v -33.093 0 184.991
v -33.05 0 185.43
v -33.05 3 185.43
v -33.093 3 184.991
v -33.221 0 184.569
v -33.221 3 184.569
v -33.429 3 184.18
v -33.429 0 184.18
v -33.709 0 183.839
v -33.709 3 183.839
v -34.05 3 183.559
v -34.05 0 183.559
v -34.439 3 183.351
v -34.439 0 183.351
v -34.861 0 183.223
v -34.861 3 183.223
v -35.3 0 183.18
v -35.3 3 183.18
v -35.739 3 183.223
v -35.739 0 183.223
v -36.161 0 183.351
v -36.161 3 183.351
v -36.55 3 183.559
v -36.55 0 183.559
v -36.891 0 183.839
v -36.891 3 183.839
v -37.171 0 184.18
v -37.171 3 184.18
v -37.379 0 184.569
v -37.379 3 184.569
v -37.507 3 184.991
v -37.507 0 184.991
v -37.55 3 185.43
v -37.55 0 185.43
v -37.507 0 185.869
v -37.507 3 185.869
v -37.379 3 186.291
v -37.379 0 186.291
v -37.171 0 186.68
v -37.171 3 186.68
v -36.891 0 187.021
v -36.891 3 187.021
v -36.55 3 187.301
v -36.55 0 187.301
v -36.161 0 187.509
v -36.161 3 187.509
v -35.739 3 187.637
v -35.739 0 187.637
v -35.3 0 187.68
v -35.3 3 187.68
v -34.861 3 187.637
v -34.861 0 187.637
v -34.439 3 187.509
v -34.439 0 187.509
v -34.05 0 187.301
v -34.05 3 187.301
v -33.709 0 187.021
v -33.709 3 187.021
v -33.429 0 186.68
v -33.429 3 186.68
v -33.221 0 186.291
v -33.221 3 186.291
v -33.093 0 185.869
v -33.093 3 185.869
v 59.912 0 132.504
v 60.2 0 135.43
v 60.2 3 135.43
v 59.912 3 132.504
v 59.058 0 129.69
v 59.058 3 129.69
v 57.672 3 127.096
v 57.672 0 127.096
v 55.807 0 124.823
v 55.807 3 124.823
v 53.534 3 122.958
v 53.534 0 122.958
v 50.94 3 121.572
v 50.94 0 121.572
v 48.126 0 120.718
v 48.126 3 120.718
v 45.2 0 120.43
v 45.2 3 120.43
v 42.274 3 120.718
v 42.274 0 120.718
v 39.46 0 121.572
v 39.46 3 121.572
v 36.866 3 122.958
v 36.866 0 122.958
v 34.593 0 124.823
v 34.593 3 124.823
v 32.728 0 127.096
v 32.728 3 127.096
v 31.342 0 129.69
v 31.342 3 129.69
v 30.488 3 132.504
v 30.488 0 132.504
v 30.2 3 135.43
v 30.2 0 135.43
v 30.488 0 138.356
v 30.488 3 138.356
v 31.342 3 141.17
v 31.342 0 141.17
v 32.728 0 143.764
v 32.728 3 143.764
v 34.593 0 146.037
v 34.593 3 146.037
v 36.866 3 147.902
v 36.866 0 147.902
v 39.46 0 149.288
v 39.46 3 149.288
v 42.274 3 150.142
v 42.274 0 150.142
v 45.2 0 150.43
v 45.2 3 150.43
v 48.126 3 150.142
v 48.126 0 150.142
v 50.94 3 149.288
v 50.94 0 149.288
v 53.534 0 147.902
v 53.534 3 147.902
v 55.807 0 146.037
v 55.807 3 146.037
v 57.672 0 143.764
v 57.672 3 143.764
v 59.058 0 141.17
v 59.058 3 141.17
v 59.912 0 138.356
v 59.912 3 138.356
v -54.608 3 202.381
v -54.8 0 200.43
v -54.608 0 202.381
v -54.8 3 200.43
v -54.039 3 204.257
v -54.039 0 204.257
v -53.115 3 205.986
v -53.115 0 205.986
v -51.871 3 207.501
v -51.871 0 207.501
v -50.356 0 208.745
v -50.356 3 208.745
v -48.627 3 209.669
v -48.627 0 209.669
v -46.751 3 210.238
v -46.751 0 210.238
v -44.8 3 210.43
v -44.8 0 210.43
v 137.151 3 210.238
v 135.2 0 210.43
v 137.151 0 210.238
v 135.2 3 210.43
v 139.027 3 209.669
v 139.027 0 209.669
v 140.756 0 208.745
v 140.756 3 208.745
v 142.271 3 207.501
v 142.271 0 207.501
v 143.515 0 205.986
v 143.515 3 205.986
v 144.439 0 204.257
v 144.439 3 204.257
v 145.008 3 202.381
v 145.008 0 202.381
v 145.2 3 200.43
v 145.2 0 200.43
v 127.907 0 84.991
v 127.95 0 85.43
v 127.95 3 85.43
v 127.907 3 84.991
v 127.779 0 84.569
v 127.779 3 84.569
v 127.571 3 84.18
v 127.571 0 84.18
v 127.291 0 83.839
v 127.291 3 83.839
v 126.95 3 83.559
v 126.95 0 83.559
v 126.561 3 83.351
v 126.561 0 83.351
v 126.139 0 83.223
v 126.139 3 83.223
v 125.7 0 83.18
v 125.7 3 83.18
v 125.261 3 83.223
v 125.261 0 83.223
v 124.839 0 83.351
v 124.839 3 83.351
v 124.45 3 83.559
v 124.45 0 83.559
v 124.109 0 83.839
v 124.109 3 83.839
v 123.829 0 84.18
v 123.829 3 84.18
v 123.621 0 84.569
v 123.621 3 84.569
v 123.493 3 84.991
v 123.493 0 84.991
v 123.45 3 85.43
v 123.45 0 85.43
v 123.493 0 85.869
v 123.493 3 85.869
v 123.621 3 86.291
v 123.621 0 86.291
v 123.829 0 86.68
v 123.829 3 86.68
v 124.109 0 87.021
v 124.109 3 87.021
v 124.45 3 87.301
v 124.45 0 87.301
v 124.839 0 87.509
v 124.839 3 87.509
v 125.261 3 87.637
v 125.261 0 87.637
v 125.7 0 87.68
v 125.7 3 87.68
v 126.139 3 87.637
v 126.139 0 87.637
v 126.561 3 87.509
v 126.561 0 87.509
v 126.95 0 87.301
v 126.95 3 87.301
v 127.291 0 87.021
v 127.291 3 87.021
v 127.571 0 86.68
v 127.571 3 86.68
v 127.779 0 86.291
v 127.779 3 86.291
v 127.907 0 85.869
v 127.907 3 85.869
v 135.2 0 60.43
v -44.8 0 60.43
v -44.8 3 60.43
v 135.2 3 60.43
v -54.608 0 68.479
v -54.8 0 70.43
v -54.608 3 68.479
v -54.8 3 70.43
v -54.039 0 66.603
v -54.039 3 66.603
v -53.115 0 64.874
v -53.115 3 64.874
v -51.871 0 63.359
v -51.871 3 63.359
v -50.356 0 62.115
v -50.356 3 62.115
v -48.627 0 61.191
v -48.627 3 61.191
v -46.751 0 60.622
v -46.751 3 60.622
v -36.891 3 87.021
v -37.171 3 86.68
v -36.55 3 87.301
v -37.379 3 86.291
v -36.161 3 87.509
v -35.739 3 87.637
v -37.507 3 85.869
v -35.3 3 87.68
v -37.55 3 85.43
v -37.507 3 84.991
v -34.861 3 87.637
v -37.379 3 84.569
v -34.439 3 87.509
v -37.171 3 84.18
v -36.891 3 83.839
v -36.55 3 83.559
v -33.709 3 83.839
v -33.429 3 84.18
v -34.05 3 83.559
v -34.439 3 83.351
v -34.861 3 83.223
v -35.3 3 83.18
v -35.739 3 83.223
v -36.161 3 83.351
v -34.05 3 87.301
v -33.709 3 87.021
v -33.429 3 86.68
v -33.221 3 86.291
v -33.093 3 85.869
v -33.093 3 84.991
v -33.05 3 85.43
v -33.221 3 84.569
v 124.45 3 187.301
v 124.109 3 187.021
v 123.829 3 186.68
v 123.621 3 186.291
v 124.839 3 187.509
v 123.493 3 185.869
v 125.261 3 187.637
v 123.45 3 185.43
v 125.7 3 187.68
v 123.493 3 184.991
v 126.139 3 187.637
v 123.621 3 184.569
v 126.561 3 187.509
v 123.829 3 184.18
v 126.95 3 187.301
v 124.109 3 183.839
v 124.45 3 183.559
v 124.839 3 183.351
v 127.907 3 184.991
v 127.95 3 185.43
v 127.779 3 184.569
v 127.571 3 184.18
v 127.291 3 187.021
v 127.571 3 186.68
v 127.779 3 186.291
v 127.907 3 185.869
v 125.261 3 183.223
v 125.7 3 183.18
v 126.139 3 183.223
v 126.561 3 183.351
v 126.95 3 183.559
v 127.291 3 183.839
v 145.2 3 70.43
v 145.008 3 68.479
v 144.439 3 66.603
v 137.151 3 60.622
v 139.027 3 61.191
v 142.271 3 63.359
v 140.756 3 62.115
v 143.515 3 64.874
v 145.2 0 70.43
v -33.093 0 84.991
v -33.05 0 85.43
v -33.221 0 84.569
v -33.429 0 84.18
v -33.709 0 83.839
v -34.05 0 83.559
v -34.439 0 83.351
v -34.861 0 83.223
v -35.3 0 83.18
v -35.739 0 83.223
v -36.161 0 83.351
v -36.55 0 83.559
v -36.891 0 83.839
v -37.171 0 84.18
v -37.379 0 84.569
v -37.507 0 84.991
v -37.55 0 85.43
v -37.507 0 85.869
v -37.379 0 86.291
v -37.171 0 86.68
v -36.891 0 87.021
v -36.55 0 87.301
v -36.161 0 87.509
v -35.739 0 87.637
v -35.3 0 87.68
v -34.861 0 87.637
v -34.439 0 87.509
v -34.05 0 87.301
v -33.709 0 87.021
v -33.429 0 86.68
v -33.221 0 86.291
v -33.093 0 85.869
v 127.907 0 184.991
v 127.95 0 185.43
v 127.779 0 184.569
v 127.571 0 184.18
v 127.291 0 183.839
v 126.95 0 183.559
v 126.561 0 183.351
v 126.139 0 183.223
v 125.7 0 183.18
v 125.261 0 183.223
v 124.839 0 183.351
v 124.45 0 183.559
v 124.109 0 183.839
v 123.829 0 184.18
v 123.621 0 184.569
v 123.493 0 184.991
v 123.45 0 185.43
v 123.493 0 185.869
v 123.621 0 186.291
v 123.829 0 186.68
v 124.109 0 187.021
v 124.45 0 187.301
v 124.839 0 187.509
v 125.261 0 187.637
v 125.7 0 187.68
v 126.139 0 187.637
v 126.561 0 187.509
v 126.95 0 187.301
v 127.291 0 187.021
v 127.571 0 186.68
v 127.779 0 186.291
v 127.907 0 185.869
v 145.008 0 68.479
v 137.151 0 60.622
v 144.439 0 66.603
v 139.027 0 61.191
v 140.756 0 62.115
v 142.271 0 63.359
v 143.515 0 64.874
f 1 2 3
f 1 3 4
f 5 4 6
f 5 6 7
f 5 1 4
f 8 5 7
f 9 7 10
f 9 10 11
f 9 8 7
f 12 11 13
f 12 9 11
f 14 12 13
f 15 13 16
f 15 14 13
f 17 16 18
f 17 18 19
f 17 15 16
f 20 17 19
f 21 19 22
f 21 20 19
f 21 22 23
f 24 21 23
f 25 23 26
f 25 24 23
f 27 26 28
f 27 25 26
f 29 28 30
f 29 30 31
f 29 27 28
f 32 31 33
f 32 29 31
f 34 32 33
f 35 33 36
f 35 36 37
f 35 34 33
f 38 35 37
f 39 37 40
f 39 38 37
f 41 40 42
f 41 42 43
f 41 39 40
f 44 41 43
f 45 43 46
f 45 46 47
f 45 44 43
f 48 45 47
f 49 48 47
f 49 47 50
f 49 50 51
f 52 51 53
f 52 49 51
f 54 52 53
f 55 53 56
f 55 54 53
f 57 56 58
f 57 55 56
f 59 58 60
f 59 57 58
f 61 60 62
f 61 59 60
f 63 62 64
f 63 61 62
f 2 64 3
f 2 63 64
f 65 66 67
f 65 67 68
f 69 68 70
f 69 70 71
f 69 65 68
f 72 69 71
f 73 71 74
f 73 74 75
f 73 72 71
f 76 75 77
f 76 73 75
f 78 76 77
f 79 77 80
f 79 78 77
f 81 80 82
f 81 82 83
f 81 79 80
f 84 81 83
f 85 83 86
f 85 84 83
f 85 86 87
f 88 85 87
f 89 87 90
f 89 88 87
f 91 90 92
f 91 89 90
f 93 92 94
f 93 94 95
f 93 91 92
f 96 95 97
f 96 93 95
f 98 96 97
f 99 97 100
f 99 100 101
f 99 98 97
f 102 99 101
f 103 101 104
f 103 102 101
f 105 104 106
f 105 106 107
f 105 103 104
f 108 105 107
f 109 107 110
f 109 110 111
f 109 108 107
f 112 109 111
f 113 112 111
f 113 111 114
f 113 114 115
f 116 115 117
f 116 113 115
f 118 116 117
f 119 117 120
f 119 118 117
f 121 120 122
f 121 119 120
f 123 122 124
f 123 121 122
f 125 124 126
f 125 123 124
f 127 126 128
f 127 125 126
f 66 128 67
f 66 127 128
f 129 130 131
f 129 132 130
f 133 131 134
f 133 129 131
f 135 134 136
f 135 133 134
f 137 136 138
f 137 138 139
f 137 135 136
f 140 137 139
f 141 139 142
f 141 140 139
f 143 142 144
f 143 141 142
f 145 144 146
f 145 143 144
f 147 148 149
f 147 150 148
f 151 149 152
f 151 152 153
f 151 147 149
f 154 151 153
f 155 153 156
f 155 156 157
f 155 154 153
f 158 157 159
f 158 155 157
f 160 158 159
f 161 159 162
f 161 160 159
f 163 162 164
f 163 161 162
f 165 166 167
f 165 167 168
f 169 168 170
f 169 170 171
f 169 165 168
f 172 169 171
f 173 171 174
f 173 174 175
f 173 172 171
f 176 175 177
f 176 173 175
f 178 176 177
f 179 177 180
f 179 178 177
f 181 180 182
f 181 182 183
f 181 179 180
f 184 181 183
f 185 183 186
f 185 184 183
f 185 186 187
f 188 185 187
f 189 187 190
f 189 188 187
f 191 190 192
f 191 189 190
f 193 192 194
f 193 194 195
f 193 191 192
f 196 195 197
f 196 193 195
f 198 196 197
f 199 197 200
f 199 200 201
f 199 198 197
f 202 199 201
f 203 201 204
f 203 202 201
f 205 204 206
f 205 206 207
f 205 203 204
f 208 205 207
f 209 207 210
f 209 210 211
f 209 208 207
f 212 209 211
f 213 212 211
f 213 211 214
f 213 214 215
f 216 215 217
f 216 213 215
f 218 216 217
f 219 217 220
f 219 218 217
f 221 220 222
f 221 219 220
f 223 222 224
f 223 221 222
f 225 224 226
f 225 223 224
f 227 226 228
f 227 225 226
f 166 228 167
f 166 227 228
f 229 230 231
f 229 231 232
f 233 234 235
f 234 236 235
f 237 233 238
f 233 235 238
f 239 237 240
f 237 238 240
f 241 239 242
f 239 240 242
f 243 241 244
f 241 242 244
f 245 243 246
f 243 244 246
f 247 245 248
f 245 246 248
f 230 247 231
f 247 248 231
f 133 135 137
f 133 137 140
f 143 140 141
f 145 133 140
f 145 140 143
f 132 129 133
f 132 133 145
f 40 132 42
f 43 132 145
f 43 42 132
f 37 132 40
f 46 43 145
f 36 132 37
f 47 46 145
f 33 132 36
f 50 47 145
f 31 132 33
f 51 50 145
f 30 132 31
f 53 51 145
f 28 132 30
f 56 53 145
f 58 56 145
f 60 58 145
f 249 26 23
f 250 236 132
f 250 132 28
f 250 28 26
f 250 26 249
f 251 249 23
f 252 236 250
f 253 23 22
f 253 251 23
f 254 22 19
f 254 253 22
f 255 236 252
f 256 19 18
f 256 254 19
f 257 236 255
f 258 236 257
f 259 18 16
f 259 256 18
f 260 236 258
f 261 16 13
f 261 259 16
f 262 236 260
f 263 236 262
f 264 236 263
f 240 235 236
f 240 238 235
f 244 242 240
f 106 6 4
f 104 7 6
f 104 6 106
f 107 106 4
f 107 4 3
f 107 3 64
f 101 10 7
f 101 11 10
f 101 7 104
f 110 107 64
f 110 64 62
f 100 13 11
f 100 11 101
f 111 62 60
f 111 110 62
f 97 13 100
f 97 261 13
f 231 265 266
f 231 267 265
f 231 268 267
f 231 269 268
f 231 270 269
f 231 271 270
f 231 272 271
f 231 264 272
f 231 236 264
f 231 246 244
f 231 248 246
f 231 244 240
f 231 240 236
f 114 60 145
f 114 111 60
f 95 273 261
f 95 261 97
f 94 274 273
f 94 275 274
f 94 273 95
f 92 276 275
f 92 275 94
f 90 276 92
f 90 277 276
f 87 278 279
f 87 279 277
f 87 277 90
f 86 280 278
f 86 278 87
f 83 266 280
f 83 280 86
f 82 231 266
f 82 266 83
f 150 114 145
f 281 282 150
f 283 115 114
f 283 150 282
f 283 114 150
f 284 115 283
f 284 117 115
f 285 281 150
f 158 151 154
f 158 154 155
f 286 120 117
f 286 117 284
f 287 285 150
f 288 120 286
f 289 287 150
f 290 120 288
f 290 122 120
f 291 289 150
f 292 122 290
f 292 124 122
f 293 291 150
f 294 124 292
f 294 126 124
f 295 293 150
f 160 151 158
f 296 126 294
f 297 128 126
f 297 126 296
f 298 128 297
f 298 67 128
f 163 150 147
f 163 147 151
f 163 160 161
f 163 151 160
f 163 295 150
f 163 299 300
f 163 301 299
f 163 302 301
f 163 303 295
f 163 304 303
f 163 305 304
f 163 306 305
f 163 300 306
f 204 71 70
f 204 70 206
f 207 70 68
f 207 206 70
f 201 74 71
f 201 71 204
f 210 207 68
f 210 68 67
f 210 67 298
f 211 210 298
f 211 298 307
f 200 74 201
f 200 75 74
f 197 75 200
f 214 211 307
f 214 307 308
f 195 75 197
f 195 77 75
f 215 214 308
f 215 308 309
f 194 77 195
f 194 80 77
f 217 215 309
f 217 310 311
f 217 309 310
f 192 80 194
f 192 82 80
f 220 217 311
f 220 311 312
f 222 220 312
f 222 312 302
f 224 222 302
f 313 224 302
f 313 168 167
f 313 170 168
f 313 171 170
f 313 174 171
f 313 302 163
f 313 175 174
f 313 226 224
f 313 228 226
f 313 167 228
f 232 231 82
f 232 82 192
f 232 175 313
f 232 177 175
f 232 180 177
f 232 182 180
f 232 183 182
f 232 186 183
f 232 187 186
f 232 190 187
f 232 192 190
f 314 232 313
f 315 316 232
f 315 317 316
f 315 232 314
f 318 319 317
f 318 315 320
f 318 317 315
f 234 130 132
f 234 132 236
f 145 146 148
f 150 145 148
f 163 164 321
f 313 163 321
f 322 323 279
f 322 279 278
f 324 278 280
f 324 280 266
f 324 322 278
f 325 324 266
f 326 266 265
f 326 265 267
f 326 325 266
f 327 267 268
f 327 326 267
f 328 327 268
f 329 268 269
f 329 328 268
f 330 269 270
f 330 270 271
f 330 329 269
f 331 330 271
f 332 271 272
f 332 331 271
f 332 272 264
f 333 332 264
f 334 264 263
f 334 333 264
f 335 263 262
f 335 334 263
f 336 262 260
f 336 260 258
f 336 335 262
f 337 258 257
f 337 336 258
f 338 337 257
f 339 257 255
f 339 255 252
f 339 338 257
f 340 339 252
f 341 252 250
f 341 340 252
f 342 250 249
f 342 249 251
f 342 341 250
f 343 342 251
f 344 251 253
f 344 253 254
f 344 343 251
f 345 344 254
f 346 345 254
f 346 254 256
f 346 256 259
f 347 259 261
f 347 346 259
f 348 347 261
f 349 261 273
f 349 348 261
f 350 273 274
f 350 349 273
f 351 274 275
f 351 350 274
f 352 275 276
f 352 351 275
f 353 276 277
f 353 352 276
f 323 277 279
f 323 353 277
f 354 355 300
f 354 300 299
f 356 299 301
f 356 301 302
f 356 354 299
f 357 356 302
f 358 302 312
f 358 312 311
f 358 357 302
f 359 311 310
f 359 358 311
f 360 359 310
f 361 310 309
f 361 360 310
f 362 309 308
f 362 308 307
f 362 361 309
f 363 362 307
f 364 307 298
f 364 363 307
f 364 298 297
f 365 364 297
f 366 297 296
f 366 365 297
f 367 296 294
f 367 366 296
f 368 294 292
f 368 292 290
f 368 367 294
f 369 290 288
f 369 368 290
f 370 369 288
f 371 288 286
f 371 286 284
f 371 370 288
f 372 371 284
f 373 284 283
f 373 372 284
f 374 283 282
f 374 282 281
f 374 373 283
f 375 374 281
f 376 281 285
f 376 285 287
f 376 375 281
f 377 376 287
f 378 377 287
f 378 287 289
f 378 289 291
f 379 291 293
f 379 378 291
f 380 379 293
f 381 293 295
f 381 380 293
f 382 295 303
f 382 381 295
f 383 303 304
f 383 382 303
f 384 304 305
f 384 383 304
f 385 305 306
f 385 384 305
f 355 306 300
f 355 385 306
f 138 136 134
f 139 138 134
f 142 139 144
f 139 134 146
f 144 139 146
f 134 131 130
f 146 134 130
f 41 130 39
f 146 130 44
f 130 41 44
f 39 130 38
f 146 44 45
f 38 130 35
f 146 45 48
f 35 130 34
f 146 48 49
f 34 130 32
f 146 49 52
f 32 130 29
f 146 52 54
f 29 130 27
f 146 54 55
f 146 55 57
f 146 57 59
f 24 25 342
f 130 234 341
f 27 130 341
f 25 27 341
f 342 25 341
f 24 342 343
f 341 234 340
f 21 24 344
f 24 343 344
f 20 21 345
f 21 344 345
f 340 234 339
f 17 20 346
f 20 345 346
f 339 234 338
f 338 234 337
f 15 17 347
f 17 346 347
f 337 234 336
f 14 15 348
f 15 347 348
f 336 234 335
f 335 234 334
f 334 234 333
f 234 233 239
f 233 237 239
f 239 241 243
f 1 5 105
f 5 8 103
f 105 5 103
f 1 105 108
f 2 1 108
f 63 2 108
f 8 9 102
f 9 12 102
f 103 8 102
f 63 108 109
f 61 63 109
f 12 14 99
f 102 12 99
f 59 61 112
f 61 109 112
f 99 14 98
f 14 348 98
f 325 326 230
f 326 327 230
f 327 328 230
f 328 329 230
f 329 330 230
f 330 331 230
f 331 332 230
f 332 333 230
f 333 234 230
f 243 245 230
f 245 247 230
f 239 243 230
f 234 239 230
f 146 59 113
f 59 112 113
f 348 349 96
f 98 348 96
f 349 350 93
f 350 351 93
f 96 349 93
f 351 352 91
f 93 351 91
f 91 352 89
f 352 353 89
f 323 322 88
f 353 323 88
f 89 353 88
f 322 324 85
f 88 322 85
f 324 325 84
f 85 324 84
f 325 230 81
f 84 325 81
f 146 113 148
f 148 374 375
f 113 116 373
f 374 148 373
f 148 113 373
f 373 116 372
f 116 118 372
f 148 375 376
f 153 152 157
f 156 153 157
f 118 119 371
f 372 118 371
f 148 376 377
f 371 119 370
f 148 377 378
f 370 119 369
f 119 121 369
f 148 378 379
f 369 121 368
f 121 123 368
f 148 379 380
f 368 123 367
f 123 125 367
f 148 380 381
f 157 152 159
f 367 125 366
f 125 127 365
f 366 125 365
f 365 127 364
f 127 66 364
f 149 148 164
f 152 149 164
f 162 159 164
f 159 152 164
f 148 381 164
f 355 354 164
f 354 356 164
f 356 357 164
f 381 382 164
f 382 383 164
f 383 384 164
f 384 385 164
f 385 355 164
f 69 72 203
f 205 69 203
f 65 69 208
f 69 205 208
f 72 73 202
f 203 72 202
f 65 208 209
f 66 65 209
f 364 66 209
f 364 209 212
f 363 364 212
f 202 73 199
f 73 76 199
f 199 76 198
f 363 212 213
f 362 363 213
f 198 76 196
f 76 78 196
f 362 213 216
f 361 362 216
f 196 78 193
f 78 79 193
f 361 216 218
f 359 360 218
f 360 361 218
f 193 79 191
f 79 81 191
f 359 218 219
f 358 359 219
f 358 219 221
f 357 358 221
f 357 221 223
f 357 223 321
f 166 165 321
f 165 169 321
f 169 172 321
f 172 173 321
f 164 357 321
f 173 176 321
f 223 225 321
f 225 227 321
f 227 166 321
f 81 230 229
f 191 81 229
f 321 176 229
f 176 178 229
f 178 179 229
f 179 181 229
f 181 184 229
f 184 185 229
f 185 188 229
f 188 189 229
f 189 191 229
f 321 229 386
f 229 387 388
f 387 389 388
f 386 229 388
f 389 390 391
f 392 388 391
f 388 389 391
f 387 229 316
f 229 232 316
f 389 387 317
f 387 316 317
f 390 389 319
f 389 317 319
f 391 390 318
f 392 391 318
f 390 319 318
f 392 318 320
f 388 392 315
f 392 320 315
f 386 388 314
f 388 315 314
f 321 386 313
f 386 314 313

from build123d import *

# Parameters (mm, degrees)
SKETCH1_W           = 200
SKETCH1_H           = 150
SKETCH1_R           = 2.25
SKETCH1_R_2         = 15
BOSS_EXTRUDE1_DEPTH = 3
FILLET1_R           = 10


with BuildPart() as part:
    # Sketch1 → Boss-Extrude1 (new body)
    with BuildSketch(Plane(origin=(0, 0, 0), x_dir=(1, 0, 0), z_dir=(0, 1, 0))):
        with Locations((45.2, -135.43)):
            Rectangle(SKETCH1_W, SKETCH1_H)
        with Locations((-35.3, -85.43)):
            Circle(SKETCH1_R, mode=Mode.SUBTRACT)
        with Locations((125.7, -85.43)):
            Circle(SKETCH1_R, mode=Mode.SUBTRACT)
        with Locations((125.7, -185.43)):
            Circle(SKETCH1_R, mode=Mode.SUBTRACT)
        with Locations((-35.3, -185.43)):
            Circle(SKETCH1_R, mode=Mode.SUBTRACT)
        with Locations((45.2, -135.43)):
            Circle(SKETCH1_R_2, mode=Mode.SUBTRACT)
    extrude(amount=BOSS_EXTRUDE1_DEPTH)

    # Fillet1
    fillet1_edges = [part.edges().sort_by_distance(p)[0] for p in [
        (145.2, 1.5, 210.43),
        (-54.8, 1.5, 210.43),
        (-54.8, 1.5, 60.43),
        (145.2, 1.5, 60.43),
    ]]
    fillet(fillet1_edges, radius=FILLET1_R)


solid = part.part
